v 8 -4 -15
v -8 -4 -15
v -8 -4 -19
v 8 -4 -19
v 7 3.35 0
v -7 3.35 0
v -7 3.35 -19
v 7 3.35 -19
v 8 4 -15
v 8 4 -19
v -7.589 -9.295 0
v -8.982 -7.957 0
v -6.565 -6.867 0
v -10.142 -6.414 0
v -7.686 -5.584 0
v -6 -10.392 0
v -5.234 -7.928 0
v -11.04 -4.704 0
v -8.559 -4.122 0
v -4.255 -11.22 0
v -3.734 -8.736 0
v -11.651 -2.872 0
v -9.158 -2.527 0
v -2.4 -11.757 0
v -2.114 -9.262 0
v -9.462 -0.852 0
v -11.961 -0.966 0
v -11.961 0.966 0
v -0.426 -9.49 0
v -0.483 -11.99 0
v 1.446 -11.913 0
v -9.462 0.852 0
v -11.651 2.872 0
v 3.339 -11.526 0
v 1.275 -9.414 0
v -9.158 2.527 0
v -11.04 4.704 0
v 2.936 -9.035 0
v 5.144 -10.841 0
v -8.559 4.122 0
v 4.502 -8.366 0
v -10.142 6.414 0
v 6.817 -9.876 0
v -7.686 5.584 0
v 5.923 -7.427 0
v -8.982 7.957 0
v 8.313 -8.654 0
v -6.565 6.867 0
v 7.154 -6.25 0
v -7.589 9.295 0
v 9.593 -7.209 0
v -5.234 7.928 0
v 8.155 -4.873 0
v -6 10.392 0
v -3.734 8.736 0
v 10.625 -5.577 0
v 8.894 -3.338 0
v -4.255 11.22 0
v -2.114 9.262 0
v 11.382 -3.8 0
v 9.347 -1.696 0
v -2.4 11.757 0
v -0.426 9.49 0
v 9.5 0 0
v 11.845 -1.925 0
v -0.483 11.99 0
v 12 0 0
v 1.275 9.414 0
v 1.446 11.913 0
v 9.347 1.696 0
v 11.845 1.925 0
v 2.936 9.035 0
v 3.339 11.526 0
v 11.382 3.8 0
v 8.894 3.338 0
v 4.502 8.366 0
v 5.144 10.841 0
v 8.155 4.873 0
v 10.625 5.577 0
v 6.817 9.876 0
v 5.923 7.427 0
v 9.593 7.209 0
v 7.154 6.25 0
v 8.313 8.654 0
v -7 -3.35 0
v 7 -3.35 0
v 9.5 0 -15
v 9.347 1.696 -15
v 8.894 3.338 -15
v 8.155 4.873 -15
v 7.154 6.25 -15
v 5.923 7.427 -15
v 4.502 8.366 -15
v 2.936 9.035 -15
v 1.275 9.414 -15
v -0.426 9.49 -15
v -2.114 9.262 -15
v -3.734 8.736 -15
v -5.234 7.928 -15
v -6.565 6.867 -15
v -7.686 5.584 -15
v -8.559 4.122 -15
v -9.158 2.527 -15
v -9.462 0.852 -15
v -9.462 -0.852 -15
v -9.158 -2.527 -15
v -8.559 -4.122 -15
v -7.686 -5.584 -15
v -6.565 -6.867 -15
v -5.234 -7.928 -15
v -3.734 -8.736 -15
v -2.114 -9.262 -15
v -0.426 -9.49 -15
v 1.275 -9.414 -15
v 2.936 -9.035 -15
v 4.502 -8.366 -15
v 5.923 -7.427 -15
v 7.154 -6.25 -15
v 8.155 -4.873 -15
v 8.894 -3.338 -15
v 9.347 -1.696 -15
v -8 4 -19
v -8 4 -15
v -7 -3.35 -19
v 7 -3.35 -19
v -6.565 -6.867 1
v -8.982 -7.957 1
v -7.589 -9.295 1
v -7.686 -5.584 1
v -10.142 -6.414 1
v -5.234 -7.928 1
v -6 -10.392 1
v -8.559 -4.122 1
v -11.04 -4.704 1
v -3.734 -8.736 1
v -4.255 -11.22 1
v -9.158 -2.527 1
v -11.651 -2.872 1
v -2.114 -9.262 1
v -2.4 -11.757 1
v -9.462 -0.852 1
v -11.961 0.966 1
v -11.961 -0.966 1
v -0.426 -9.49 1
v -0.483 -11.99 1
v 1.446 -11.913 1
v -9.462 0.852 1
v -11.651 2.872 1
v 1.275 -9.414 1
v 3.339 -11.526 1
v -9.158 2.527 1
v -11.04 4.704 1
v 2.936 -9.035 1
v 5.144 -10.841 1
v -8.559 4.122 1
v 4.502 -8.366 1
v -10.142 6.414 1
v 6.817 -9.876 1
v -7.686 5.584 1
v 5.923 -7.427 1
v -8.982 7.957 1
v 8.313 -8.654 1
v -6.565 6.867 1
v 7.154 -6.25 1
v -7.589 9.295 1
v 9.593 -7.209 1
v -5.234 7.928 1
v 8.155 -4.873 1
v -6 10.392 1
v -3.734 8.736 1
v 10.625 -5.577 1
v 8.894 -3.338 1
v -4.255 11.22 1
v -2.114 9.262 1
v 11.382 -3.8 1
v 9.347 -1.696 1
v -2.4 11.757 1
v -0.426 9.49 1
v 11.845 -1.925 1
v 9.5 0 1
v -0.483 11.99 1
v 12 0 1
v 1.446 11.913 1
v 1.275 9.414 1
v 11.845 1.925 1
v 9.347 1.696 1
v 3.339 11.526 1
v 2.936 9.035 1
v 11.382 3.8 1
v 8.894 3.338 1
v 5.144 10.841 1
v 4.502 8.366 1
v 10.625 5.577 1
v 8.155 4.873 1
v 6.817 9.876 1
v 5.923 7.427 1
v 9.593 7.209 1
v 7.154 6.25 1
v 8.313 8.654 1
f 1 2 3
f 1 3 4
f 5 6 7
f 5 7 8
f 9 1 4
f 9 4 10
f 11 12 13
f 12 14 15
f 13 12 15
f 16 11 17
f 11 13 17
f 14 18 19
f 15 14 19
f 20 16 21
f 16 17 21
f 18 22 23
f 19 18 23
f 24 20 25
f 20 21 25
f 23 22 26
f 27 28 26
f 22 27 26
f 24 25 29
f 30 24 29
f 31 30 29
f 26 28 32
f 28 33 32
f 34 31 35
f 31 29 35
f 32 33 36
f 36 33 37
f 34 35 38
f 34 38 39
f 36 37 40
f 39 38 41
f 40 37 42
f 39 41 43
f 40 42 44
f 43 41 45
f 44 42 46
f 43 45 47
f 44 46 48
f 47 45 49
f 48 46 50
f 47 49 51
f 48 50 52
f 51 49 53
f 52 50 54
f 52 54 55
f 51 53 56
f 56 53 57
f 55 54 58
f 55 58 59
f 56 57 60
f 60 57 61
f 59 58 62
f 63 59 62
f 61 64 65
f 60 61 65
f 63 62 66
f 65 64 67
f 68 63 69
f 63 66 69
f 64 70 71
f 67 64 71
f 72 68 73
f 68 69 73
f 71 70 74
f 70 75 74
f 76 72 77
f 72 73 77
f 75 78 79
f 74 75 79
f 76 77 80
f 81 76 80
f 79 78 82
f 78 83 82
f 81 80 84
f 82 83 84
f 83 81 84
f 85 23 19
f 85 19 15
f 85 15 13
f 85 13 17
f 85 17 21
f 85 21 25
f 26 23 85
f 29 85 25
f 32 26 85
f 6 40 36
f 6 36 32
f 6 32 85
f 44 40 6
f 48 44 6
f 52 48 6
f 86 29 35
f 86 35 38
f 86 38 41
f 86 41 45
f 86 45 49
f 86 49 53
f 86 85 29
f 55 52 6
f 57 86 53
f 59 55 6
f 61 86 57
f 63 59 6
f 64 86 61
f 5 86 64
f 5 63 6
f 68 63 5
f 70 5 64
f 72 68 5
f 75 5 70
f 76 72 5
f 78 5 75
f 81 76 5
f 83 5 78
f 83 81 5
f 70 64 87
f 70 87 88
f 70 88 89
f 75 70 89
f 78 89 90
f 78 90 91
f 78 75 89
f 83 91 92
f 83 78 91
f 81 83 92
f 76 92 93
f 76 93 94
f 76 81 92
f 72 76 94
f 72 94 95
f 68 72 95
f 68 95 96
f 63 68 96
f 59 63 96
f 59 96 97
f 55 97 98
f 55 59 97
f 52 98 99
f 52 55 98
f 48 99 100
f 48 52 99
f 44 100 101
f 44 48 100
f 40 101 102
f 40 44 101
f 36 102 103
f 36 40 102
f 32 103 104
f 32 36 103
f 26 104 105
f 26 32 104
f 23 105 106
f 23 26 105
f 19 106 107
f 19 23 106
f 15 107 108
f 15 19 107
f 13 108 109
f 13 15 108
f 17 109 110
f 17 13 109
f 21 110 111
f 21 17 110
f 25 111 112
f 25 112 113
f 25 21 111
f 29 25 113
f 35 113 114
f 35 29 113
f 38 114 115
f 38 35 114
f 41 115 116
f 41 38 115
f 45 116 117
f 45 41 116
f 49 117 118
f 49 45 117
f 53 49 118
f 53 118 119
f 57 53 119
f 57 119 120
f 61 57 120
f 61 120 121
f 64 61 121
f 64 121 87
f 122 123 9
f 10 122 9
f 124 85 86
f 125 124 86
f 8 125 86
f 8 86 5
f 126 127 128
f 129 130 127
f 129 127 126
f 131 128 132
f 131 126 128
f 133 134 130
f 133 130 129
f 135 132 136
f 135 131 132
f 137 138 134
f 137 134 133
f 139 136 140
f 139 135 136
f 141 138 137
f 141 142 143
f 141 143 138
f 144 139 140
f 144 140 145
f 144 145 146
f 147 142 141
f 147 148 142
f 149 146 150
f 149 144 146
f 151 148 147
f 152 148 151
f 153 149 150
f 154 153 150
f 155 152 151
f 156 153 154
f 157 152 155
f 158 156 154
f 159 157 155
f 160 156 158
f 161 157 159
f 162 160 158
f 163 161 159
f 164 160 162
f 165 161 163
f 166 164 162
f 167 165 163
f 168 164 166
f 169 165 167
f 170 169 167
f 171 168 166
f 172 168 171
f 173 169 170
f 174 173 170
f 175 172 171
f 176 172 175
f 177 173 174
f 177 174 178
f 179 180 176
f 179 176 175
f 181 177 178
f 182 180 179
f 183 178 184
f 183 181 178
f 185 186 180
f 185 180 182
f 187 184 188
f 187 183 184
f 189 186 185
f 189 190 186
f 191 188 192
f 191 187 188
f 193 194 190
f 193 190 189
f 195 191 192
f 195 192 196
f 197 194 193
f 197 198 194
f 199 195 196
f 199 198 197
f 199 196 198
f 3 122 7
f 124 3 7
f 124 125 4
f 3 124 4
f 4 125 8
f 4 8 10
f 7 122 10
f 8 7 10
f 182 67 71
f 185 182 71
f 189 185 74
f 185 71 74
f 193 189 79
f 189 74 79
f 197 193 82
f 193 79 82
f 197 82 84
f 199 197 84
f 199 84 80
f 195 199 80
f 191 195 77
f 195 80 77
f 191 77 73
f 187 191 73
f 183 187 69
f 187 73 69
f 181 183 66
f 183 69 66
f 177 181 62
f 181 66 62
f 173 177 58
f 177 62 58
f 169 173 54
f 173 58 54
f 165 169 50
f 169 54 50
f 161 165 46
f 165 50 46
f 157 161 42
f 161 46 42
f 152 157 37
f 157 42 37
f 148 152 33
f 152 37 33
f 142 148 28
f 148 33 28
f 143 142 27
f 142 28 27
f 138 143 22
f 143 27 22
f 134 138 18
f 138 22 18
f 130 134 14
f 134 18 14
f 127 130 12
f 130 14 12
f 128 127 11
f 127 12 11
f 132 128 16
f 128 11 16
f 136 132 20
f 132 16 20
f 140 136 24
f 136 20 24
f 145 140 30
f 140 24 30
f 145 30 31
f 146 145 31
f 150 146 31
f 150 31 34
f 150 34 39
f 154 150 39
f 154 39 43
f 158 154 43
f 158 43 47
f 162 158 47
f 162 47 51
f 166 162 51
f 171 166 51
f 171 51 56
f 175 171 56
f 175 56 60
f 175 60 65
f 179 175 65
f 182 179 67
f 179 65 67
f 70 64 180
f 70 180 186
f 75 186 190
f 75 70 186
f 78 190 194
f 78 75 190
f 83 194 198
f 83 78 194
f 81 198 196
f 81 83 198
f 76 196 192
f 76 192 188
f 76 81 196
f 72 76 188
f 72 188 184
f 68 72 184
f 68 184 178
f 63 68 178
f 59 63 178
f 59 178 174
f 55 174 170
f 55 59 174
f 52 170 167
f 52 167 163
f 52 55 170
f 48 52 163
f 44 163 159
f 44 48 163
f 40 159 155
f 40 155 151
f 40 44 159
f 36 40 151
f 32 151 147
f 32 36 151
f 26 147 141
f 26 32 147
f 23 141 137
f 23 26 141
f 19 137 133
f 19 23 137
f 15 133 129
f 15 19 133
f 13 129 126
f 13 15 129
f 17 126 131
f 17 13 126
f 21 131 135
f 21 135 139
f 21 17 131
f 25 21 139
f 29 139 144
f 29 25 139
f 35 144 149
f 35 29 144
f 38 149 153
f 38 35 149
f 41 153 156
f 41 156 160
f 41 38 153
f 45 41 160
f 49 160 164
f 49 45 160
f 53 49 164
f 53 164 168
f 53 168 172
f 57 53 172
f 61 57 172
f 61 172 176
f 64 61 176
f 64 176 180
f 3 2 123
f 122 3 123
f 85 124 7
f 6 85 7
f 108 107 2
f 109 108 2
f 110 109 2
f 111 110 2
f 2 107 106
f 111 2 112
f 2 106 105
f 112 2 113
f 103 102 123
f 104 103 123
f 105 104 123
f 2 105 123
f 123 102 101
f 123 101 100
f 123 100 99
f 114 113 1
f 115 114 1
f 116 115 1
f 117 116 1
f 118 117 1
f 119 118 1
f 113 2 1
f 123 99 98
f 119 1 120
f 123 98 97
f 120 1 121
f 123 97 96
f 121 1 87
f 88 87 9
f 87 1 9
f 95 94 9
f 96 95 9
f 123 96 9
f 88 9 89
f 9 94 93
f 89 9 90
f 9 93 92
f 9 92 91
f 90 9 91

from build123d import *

# Parameters (mm, degrees)
F0_W     = 16
F0_H     = 8
F0_W_2   = 14
F0_H_2   = 6.7
F1_DEPTH = 19
F0_R     = 12
F0_R_2   = 9.5
F2_DEPTH = 1
F3_DEPTH = 15


with BuildPart() as f1:
    # F0 (on Top) → F1 (new body)
    with BuildSketch(Plane.XY):
        Rectangle(F0_W, F0_H)
        Rectangle(F0_W_2, F0_H_2, mode=Mode.SUBTRACT)
    extrude(amount=-F1_DEPTH)



with BuildPart() as f2:
    # F0 (on Top) → F2 (new body)
    with BuildSketch(Plane.XY):
        Circle(F0_R)
        Circle(F0_R_2, mode=Mode.SUBTRACT)
    extrude(amount=F2_DEPTH)


with BuildPart() as f1_1:
    add(f1.part)

    add(f2.part)  # F3 merges F2
    # F0 (on Top) → F3 (join)
    with BuildSketch(Plane.XY):
        Circle(F0_R_2)
        Rectangle(F0_W, F0_H, mode=Mode.SUBTRACT)
    extrude(amount=-F3_DEPTH)


solid = f1_1.part
